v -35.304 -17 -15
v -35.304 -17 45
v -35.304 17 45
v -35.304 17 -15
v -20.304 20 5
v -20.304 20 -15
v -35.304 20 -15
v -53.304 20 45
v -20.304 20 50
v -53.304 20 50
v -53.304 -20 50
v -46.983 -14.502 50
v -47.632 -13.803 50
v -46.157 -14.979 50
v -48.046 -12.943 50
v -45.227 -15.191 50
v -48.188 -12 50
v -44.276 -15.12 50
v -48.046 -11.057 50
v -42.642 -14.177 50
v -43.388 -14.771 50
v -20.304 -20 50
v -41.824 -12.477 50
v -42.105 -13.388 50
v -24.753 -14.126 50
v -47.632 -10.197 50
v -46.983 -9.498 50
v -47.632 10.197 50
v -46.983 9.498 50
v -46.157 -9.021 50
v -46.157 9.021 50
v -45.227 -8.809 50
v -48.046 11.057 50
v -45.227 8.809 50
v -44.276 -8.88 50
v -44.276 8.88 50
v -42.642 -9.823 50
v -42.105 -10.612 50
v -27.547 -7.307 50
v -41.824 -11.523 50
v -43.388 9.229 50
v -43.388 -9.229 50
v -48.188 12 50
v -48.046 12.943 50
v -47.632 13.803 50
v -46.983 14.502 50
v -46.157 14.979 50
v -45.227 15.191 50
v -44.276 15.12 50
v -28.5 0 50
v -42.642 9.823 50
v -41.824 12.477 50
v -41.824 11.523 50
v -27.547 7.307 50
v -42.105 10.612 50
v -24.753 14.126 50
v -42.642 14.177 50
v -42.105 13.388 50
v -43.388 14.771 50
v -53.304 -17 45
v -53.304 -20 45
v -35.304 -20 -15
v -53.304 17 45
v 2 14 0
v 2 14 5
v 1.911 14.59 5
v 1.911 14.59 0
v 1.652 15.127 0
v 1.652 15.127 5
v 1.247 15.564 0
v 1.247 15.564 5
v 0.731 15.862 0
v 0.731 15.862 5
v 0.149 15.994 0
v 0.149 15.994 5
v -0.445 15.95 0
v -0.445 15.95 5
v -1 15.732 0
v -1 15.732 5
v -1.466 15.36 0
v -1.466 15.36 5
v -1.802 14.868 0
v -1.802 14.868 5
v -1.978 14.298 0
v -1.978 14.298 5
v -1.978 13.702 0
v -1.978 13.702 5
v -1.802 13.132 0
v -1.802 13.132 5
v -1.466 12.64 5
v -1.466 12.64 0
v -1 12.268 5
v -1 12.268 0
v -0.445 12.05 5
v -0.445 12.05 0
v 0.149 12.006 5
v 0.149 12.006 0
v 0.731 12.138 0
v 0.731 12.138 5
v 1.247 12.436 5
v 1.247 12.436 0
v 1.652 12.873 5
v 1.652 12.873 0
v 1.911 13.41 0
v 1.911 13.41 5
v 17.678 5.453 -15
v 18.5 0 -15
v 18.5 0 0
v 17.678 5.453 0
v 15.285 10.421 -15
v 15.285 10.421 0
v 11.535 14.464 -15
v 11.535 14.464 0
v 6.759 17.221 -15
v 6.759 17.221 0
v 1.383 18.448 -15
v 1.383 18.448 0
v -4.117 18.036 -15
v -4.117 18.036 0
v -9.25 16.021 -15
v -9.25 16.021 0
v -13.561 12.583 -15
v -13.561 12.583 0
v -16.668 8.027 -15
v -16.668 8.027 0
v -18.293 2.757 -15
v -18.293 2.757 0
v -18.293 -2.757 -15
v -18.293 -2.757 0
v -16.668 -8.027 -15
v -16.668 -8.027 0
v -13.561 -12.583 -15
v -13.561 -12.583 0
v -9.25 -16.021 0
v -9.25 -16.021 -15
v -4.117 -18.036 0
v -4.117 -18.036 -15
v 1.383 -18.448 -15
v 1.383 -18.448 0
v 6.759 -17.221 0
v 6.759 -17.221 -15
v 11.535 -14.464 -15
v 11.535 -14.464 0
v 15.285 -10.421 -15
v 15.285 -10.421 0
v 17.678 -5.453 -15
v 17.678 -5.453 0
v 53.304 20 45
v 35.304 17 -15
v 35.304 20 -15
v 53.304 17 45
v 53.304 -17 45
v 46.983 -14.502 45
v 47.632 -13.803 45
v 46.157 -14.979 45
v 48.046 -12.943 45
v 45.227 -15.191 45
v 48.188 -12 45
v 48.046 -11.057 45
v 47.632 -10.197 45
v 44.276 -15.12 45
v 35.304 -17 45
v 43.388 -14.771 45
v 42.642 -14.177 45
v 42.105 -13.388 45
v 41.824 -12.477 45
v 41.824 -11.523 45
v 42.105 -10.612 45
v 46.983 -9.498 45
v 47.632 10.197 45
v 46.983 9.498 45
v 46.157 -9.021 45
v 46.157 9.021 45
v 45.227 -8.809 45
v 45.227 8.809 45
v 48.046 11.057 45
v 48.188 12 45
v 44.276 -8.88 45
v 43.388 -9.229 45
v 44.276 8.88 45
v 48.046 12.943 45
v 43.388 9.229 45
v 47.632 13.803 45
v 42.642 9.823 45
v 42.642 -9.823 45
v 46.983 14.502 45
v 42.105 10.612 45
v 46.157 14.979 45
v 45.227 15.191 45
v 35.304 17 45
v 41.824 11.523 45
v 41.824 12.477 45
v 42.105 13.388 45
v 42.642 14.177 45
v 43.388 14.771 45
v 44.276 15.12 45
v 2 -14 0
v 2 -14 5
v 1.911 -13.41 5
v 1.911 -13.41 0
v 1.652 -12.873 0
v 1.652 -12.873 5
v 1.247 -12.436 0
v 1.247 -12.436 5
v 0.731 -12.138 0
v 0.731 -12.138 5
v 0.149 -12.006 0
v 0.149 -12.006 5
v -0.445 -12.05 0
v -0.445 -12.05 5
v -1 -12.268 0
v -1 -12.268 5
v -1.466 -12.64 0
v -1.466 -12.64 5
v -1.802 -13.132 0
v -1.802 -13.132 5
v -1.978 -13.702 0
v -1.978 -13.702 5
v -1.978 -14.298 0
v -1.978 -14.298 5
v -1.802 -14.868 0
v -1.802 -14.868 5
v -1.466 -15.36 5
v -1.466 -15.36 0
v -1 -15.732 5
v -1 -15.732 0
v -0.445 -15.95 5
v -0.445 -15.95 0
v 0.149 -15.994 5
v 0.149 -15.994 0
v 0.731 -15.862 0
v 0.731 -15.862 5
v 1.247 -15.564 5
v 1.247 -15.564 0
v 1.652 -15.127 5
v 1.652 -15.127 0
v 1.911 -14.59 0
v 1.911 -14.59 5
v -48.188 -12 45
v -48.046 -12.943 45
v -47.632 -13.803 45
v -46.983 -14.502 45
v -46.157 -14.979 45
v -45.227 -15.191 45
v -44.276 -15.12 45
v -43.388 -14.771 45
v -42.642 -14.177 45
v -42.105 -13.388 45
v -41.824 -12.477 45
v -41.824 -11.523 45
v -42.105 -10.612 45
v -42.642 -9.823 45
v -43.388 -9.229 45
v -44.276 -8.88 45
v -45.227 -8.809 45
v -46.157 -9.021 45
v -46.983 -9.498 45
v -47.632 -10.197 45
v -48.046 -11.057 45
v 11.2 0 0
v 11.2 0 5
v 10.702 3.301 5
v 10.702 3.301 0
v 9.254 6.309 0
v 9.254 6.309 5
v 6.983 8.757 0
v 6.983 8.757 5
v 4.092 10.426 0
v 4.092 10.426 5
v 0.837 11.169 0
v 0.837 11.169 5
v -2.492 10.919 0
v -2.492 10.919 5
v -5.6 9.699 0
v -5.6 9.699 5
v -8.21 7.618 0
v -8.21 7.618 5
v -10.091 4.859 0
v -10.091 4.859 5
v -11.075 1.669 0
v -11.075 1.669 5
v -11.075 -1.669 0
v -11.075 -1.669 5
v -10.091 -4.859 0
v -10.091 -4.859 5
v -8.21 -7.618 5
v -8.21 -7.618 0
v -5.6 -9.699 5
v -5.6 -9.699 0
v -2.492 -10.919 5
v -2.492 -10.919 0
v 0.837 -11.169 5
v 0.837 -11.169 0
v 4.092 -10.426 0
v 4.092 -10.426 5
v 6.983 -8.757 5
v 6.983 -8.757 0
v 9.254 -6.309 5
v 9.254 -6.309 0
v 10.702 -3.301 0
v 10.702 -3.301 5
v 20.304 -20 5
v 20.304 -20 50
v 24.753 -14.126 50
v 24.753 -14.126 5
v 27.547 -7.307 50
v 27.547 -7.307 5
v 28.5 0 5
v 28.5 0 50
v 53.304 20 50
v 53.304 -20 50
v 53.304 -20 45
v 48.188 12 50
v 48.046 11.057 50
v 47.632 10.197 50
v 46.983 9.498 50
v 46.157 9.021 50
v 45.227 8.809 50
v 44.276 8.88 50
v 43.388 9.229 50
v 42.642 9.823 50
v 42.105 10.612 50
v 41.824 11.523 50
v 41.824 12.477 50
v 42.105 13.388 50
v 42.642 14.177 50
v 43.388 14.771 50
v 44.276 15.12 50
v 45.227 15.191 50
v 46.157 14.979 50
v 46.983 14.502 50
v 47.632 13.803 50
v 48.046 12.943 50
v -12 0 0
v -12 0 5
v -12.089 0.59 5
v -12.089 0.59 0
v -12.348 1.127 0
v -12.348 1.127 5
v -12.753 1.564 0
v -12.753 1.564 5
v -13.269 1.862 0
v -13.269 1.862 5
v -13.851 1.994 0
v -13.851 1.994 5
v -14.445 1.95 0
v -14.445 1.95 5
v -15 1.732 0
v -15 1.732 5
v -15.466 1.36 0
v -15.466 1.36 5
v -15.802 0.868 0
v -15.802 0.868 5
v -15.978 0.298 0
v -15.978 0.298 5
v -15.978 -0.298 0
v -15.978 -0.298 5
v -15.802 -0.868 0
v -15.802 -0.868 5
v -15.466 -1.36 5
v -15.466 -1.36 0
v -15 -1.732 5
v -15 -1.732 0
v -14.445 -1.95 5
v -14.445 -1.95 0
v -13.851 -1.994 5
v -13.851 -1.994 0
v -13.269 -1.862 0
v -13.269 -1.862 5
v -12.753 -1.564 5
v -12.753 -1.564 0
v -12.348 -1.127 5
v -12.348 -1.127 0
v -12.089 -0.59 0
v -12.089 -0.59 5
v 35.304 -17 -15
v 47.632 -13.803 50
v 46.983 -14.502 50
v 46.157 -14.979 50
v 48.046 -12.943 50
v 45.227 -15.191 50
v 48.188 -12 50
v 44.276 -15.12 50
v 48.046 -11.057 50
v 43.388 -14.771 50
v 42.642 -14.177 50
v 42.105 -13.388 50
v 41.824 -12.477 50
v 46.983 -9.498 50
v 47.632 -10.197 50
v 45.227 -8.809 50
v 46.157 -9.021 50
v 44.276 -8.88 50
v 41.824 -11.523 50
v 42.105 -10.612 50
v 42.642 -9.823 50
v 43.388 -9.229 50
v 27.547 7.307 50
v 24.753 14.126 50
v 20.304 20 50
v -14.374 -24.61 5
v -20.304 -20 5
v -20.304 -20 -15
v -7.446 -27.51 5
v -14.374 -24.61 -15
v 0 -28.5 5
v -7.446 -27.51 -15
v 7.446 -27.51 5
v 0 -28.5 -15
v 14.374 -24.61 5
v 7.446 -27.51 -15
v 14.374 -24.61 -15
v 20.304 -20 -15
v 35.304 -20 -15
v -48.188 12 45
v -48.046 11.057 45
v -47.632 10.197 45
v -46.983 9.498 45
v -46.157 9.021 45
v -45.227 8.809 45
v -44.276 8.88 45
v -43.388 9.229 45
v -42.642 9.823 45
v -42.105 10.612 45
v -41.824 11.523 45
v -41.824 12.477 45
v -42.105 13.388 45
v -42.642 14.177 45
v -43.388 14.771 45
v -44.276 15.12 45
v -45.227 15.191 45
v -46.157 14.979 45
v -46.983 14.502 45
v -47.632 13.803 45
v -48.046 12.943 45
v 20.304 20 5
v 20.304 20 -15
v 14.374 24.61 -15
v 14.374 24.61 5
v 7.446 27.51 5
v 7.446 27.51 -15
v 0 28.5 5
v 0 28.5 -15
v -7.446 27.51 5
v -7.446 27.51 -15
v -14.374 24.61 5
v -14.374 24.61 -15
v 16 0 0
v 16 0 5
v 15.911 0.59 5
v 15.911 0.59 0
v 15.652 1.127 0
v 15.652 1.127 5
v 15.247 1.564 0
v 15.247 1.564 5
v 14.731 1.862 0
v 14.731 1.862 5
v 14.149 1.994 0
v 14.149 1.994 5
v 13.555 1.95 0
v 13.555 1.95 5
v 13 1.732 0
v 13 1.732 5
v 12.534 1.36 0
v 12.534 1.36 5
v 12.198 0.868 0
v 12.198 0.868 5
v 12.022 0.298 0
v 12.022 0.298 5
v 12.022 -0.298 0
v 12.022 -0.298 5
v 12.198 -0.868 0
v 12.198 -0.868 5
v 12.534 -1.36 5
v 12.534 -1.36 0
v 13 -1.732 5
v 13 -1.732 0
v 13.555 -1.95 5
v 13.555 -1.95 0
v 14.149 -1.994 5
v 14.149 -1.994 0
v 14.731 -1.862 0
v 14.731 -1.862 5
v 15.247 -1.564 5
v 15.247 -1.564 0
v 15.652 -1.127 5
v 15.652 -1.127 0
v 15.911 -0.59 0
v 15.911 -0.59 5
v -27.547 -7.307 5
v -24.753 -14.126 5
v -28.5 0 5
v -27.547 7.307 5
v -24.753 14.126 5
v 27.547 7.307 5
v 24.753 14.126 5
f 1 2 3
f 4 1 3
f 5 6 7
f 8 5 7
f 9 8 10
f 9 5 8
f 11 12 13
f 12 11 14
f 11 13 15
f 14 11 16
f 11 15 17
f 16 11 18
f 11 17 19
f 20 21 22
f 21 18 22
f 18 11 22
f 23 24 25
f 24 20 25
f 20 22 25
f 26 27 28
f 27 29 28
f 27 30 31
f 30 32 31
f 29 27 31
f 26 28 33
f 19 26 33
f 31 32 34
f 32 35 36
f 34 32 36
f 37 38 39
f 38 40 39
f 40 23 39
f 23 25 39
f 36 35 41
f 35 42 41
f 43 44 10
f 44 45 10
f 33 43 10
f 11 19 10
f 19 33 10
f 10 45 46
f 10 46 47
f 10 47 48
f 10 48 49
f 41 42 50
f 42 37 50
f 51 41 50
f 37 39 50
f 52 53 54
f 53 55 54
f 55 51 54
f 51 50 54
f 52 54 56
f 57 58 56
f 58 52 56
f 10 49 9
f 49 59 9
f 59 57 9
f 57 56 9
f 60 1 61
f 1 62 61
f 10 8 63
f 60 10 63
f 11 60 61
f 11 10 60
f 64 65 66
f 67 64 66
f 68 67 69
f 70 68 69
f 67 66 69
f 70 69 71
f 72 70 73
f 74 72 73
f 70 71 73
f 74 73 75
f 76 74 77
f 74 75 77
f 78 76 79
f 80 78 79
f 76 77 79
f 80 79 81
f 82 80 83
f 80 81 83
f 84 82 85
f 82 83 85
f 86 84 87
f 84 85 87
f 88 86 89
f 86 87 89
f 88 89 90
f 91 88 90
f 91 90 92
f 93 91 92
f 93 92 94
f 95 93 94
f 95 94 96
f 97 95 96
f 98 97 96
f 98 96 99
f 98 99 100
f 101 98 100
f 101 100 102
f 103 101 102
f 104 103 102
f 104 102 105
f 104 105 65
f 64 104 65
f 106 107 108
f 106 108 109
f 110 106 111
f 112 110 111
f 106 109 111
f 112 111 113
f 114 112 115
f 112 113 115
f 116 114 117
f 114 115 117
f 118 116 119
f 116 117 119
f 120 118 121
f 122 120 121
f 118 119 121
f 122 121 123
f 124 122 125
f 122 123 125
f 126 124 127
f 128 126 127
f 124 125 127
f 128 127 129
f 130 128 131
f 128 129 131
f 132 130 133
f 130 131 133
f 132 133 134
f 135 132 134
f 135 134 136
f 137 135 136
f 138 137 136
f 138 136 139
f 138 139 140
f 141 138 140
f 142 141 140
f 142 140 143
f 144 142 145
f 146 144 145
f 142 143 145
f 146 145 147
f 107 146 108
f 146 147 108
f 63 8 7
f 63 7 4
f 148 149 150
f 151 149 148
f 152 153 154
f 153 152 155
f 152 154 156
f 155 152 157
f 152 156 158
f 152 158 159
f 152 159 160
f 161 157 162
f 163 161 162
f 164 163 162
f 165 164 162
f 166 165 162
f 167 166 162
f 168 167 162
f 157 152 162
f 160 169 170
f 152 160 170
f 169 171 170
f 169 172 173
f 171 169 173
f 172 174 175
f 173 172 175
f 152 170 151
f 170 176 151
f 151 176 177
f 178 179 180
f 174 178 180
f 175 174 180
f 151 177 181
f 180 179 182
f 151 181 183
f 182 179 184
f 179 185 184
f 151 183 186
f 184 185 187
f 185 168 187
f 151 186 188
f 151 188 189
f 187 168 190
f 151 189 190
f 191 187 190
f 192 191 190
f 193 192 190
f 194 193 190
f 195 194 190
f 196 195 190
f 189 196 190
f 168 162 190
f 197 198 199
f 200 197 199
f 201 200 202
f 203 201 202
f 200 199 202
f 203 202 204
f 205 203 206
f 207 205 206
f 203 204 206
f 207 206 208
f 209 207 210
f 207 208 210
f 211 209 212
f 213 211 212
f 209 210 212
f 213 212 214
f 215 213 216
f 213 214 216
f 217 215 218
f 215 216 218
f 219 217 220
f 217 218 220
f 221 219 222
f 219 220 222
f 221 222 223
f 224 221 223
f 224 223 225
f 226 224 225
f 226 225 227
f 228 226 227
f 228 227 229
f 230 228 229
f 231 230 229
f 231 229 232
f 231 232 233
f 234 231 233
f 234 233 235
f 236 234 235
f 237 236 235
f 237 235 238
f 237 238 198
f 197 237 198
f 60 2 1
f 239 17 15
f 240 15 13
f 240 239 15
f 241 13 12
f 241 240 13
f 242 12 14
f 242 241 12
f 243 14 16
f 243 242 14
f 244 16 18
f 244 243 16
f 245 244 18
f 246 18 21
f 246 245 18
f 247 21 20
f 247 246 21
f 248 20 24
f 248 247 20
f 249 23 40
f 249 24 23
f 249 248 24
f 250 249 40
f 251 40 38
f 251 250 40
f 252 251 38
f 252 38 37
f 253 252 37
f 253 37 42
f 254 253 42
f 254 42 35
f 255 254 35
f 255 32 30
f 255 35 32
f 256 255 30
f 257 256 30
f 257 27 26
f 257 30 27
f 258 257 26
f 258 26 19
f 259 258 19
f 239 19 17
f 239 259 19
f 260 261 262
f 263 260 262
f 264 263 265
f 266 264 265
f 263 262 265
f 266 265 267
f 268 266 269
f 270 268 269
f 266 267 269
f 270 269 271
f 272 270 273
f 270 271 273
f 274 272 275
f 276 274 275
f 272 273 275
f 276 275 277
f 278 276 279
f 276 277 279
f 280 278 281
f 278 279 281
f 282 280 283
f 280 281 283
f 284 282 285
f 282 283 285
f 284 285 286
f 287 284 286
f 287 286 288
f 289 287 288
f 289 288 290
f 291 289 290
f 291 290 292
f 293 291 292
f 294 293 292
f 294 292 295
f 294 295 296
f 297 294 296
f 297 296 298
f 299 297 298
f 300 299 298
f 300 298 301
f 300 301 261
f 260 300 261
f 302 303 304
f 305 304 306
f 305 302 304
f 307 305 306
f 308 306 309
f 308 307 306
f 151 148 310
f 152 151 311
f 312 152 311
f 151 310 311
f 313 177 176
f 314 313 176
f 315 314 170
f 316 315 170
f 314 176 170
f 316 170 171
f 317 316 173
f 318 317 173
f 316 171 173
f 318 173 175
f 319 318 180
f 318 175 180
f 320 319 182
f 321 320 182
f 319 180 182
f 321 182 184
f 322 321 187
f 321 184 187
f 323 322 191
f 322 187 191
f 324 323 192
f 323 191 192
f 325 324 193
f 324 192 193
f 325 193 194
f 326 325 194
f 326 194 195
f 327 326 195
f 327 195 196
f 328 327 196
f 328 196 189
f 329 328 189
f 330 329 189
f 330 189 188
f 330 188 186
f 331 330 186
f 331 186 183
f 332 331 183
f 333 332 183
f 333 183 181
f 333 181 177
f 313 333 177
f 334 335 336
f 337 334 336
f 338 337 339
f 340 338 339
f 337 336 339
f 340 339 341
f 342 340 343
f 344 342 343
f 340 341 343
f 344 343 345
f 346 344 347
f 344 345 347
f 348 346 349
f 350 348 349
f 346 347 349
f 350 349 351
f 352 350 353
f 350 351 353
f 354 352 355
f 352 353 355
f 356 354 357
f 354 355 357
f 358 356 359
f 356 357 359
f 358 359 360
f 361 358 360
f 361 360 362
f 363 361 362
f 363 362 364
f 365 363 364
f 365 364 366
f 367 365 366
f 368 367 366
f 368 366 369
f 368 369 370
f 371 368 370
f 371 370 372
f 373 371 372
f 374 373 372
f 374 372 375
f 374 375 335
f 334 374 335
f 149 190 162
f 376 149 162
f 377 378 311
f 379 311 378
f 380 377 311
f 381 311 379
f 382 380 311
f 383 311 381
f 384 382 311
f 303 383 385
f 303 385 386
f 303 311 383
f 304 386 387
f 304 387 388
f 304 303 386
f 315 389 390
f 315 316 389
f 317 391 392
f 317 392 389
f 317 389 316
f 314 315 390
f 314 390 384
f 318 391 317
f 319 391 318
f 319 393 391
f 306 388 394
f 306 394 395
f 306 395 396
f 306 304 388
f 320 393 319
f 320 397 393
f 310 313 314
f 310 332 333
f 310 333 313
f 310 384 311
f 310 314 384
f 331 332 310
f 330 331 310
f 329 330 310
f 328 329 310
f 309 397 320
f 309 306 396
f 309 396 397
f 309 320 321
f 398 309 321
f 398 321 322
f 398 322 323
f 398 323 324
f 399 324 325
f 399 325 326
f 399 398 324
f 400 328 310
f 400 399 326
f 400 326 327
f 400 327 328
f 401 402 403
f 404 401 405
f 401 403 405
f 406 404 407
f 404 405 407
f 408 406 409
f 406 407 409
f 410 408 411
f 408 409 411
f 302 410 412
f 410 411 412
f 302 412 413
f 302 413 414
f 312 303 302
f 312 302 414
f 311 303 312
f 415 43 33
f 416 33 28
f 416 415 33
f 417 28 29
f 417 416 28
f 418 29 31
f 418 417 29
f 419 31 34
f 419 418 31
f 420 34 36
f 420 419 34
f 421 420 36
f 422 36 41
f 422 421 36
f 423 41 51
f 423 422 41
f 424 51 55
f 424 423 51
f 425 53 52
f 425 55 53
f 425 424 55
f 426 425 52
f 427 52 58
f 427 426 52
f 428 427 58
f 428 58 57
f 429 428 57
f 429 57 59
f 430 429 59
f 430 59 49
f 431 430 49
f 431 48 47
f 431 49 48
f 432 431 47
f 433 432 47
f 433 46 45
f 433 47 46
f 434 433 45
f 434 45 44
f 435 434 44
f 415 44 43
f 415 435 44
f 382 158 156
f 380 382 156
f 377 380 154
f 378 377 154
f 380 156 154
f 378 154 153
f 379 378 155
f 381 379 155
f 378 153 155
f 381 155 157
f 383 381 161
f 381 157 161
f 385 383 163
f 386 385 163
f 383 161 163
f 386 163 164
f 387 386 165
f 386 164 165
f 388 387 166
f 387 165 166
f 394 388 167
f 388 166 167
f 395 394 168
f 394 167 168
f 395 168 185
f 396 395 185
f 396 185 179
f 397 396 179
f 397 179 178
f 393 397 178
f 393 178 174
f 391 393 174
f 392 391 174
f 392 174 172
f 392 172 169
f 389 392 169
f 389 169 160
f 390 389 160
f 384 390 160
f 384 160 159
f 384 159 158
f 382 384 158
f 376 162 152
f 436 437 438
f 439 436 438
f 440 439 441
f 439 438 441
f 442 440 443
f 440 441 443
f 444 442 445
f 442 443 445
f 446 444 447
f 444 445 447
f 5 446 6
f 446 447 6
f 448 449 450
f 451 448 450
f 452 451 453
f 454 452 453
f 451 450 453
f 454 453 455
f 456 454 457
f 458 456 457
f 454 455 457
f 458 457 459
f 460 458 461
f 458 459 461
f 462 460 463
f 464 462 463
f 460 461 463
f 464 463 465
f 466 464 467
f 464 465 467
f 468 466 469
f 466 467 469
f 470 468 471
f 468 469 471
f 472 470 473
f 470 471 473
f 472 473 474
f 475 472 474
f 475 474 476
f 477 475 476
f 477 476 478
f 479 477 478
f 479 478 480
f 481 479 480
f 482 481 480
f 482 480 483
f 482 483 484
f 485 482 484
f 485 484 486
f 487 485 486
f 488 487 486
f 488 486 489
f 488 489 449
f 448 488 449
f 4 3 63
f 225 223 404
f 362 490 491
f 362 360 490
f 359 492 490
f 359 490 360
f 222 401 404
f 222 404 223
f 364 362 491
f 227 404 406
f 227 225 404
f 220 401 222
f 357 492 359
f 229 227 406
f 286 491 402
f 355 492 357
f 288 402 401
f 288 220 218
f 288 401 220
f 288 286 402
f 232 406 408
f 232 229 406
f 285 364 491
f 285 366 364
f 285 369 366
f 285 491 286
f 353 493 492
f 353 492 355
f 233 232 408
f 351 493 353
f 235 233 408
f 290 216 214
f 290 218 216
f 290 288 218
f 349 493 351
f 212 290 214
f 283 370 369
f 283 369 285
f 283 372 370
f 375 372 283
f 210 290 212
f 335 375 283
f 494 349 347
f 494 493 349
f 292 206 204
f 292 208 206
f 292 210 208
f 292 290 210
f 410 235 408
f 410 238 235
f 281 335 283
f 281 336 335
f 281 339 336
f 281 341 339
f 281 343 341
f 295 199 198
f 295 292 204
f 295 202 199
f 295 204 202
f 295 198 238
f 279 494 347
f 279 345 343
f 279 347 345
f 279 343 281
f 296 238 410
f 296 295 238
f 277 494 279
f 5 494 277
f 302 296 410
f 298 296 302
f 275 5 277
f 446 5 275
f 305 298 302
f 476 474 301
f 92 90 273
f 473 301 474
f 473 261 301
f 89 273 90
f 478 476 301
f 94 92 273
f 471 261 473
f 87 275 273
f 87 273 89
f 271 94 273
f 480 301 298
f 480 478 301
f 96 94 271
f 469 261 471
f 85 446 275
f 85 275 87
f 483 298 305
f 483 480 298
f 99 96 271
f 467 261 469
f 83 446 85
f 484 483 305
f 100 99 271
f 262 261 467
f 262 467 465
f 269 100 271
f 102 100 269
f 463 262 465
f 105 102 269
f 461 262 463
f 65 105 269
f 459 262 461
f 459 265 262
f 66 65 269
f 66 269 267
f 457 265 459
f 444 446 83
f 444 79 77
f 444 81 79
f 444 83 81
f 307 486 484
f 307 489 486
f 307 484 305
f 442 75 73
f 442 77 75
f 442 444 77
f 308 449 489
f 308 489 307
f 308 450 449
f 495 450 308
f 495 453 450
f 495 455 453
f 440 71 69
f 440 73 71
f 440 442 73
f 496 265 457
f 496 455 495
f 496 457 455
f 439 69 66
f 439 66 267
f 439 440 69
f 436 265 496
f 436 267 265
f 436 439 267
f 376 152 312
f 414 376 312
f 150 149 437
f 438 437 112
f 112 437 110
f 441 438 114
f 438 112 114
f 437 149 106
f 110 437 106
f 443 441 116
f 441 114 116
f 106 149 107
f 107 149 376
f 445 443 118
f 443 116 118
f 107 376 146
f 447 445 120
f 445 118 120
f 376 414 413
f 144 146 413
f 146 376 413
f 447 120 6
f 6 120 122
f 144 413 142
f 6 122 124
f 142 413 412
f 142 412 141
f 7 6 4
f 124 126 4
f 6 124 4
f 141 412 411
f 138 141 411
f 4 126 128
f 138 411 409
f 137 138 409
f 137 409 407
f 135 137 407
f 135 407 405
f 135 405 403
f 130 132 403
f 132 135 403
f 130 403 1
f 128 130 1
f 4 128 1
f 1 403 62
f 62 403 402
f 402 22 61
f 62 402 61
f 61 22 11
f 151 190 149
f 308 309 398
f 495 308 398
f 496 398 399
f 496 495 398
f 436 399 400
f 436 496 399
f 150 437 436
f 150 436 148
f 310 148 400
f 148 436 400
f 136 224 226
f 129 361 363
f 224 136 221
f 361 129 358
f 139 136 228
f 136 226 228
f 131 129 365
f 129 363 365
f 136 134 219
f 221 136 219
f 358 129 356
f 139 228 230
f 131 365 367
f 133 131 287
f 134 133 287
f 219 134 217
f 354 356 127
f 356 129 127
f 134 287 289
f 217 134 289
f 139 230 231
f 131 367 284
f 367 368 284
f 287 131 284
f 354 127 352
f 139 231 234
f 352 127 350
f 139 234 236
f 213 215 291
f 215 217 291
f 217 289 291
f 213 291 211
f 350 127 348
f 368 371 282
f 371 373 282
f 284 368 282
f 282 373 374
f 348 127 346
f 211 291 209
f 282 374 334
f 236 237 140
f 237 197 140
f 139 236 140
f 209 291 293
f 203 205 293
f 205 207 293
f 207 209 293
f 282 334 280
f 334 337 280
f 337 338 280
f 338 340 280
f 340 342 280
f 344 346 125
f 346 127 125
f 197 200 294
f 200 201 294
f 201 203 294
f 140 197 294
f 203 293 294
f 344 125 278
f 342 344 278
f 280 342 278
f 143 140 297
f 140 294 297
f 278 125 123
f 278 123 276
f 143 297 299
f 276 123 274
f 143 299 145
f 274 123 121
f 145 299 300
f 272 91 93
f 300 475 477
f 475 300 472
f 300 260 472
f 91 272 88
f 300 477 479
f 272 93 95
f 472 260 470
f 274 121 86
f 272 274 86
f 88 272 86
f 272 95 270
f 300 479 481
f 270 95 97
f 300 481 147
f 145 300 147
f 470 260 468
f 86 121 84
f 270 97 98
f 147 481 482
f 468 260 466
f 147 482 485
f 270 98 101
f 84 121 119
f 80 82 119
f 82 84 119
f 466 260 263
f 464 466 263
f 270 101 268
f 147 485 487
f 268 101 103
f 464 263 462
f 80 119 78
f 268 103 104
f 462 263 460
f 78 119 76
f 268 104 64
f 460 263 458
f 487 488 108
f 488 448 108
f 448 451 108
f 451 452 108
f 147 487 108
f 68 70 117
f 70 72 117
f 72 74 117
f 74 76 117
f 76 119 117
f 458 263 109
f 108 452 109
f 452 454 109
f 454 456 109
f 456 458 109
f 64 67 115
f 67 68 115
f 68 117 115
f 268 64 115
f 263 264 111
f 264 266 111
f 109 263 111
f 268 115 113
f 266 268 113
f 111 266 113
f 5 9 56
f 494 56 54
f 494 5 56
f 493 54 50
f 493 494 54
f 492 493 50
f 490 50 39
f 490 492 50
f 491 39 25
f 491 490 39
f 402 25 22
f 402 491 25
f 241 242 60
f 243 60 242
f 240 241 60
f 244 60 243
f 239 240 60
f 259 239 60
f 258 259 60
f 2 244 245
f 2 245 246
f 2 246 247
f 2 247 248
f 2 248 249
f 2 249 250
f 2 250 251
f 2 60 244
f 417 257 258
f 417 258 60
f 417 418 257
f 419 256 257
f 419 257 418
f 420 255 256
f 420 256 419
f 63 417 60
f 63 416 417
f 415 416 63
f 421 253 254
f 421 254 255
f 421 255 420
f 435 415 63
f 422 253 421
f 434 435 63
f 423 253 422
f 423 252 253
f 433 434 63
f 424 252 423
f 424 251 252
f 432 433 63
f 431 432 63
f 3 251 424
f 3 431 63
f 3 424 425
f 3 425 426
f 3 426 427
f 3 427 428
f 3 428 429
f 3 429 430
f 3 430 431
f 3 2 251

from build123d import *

# Parameters (mm, degrees)
F0_R         = 28.5
F0_R_2       = 18.5
F1_DEPTH     = 15
F2_R         = 28.5
F2_R_2       = 18.5
F3_DEPTH     = 5
F4_R         = 2
F4_R_2       = 11.2
F5_DEPTH     = 25
F7_DEPTH     = 65
F8_W         = 40
F8_H         = 5
F9_DEPTH     = 18
F10_R        = 3.2
F11_DEPTH    = 25
F12_W        = 18
F12_H        = 3
F13_DEPTH    = 60
F14_C1_SIZE2 = 60
F14_C1_SIZE  = 18
F14_C2_SIZE2 = 60
F14_C2_SIZE  = 18
F14_C3_SIZE2 = 60
F14_C3_SIZE  = 18
F14_C4_SIZE2 = 60
F14_C4_SIZE  = 18


# Not quite as in the source:
# - a pattern or mirror of a feature is missing from the dataset's text; its kind, count and spacing are read off the source's solid
# - a feature names something its author has since deleted; it is built from what else it names


with BuildPart() as f1:
    # F0 (on Top) → F1 (new body)
    with BuildSketch(Plane.XY):
        Circle(F0_R)
        Circle(F0_R_2, mode=Mode.SUBTRACT)
    extrude(amount=-F1_DEPTH)

    # F2 (on face) → F3 (join)
    with BuildSketch(Plane.XY):
        Circle(F2_R)
        Circle(F2_R_2, mode=Mode.SUBTRACT)
        Circle(F2_R_2)
    extrude(amount=F3_DEPTH)

    # F4 (on face) → F5 (cut)
    with BuildSketch(Plane.XY.offset(5)):
        with Locations((0, 14)):
            Circle(F4_R)
        Circle(F4_R_2)
        with Locations((-14, 0)):
            Circle(F4_R)
        with Locations((0, -14)):
            Circle(F4_R)
        with Locations((14, 0)):
            Circle(F4_R)
    extrude(amount=-F5_DEPTH, mode=Mode.SUBTRACT)

    # F6 (on face) → F7 (join)
    with BuildSketch(Plane(origin=(0, 0, -15), x_dir=(1, 0, 0), z_dir=(0, 0, -1))):
        with BuildLine():
            ThreePointArc((-20.3039405042, -20), (-28.5, 0), (-20.3039405042, 20))
            Line((-20.3039405042, 20), (-35.3039405042, 20))
            Line((-35.3039405042, 20), (-35.3039405042, -20))
            Line((-35.3039405042, -20), (-20.3039405042, -20))
        make_face()
        with BuildLine():
            Line((35.3039405042, 20), (20.3039405042, 20))
            ThreePointArc((20.3039405042, 20), (26.3715026532, 10.8071202369), (28.5, 0))
            ThreePointArc((28.5, 0), (26.3715026532, -10.8071202369), (20.3039405042, -20))
            Line((20.3039405042, -20), (35.3039405042, -20))
            Line((35.3039405042, -20), (35.3039405042, 20))
        make_face()
    extrude(amount=-F7_DEPTH)

    # F8 (on face) → F9 (join)
    with BuildSketch(Plane.YZ.offset(35.3039405042)):
        with Locations((0, 47.5)):
            Rectangle(F8_W, F8_H)
    f9 = extrude(amount=F9_DEPTH)

    # F9_copies: F9 across plane
    add(f9.mirror(Plane(origin=(0, 0, 0), x_dir=(0, 0, -1), z_dir=(-1, 0, 0))))

    # F10 (on face) → F11 (cut)
    with BuildSketch(Plane(origin=(0, 0, 45), x_dir=(1, 0, 0), z_dir=(0, 0, -1))):
        with Locations((44.9877695576, 12)):
            Circle(F10_R)
        with Locations((44.9877695576, -12)):
            Circle(F10_R)
    f11 = extrude(amount=-F11_DEPTH, mode=Mode.SUBTRACT)

    # F11_copies: F11 across plane
    add(f11.mirror(Plane(origin=(0, 0, 0), x_dir=(0, 0, -1), z_dir=(-1, 0, 0))), mode=Mode.SUBTRACT)

    # F12 (on face) → F13 (join)
    with BuildSketch(Plane(origin=(0, 0, 45), x_dir=(1, 0, 0), z_dir=(0, 0, -1))):
        with Locations((44.3039405042, 18.5)):
            Rectangle(F12_W, F12_H)
        with Locations((44.3039405042, -18.5)):
            Rectangle(F12_W, F12_H)
    f13 = extrude(amount=F13_DEPTH)

    # F13_copies: F13 across plane
    add(f13.mirror(Plane(origin=(0, 0, 0), x_dir=(0, 0, -1), z_dir=(-1, 0, 0))))

    # F14: chamfer of 60 x 18 on 4 edges, made by hand

    # F14_c1
    f14_c1_edges = [f1.edges().sort_by_distance(p)[0] for p in [
        (-53.3039405042, 18.5, -15),
    ]]
    f14_c1_side = f1.faces().sort_by_distance((-52.9439405042, 18.5, -15))[0]
    chamfer(f14_c1_edges, length=F14_C1_SIZE, length2=F14_C1_SIZE2, reference=f14_c1_side)

    # F14_c2
    f14_c2_edges = [f1.edges().sort_by_distance(p)[0] for p in [
        (-53.3039405042, -18.5, -15),
    ]]
    f14_c2_side = f1.faces().sort_by_distance((-52.9439405042, -18.5, -15))[0]
    chamfer(f14_c2_edges, length=F14_C2_SIZE, length2=F14_C2_SIZE2, reference=f14_c2_side)

    # F14_c3
    f14_c3_edges = [f1.edges().sort_by_distance(p)[0] for p in [
        (53.3039405042, -18.5, -15),
    ]]
    f14_c3_side = f1.faces().sort_by_distance((52.9439405042, -18.5, -15))[0]
    chamfer(f14_c3_edges, length=F14_C3_SIZE, length2=F14_C3_SIZE2, reference=f14_c3_side)

    # F14_c4
    f14_c4_edges = [f1.edges().sort_by_distance(p)[0] for p in [
        (53.3039405042, 18.5, -15),
    ]]
    f14_c4_side = f1.faces().sort_by_distance((52.9439405042, 18.5, -15))[0]
    chamfer(f14_c4_edges, length=F14_C4_SIZE, length2=F14_C4_SIZE2, reference=f14_c4_side)


solid = f1.part
